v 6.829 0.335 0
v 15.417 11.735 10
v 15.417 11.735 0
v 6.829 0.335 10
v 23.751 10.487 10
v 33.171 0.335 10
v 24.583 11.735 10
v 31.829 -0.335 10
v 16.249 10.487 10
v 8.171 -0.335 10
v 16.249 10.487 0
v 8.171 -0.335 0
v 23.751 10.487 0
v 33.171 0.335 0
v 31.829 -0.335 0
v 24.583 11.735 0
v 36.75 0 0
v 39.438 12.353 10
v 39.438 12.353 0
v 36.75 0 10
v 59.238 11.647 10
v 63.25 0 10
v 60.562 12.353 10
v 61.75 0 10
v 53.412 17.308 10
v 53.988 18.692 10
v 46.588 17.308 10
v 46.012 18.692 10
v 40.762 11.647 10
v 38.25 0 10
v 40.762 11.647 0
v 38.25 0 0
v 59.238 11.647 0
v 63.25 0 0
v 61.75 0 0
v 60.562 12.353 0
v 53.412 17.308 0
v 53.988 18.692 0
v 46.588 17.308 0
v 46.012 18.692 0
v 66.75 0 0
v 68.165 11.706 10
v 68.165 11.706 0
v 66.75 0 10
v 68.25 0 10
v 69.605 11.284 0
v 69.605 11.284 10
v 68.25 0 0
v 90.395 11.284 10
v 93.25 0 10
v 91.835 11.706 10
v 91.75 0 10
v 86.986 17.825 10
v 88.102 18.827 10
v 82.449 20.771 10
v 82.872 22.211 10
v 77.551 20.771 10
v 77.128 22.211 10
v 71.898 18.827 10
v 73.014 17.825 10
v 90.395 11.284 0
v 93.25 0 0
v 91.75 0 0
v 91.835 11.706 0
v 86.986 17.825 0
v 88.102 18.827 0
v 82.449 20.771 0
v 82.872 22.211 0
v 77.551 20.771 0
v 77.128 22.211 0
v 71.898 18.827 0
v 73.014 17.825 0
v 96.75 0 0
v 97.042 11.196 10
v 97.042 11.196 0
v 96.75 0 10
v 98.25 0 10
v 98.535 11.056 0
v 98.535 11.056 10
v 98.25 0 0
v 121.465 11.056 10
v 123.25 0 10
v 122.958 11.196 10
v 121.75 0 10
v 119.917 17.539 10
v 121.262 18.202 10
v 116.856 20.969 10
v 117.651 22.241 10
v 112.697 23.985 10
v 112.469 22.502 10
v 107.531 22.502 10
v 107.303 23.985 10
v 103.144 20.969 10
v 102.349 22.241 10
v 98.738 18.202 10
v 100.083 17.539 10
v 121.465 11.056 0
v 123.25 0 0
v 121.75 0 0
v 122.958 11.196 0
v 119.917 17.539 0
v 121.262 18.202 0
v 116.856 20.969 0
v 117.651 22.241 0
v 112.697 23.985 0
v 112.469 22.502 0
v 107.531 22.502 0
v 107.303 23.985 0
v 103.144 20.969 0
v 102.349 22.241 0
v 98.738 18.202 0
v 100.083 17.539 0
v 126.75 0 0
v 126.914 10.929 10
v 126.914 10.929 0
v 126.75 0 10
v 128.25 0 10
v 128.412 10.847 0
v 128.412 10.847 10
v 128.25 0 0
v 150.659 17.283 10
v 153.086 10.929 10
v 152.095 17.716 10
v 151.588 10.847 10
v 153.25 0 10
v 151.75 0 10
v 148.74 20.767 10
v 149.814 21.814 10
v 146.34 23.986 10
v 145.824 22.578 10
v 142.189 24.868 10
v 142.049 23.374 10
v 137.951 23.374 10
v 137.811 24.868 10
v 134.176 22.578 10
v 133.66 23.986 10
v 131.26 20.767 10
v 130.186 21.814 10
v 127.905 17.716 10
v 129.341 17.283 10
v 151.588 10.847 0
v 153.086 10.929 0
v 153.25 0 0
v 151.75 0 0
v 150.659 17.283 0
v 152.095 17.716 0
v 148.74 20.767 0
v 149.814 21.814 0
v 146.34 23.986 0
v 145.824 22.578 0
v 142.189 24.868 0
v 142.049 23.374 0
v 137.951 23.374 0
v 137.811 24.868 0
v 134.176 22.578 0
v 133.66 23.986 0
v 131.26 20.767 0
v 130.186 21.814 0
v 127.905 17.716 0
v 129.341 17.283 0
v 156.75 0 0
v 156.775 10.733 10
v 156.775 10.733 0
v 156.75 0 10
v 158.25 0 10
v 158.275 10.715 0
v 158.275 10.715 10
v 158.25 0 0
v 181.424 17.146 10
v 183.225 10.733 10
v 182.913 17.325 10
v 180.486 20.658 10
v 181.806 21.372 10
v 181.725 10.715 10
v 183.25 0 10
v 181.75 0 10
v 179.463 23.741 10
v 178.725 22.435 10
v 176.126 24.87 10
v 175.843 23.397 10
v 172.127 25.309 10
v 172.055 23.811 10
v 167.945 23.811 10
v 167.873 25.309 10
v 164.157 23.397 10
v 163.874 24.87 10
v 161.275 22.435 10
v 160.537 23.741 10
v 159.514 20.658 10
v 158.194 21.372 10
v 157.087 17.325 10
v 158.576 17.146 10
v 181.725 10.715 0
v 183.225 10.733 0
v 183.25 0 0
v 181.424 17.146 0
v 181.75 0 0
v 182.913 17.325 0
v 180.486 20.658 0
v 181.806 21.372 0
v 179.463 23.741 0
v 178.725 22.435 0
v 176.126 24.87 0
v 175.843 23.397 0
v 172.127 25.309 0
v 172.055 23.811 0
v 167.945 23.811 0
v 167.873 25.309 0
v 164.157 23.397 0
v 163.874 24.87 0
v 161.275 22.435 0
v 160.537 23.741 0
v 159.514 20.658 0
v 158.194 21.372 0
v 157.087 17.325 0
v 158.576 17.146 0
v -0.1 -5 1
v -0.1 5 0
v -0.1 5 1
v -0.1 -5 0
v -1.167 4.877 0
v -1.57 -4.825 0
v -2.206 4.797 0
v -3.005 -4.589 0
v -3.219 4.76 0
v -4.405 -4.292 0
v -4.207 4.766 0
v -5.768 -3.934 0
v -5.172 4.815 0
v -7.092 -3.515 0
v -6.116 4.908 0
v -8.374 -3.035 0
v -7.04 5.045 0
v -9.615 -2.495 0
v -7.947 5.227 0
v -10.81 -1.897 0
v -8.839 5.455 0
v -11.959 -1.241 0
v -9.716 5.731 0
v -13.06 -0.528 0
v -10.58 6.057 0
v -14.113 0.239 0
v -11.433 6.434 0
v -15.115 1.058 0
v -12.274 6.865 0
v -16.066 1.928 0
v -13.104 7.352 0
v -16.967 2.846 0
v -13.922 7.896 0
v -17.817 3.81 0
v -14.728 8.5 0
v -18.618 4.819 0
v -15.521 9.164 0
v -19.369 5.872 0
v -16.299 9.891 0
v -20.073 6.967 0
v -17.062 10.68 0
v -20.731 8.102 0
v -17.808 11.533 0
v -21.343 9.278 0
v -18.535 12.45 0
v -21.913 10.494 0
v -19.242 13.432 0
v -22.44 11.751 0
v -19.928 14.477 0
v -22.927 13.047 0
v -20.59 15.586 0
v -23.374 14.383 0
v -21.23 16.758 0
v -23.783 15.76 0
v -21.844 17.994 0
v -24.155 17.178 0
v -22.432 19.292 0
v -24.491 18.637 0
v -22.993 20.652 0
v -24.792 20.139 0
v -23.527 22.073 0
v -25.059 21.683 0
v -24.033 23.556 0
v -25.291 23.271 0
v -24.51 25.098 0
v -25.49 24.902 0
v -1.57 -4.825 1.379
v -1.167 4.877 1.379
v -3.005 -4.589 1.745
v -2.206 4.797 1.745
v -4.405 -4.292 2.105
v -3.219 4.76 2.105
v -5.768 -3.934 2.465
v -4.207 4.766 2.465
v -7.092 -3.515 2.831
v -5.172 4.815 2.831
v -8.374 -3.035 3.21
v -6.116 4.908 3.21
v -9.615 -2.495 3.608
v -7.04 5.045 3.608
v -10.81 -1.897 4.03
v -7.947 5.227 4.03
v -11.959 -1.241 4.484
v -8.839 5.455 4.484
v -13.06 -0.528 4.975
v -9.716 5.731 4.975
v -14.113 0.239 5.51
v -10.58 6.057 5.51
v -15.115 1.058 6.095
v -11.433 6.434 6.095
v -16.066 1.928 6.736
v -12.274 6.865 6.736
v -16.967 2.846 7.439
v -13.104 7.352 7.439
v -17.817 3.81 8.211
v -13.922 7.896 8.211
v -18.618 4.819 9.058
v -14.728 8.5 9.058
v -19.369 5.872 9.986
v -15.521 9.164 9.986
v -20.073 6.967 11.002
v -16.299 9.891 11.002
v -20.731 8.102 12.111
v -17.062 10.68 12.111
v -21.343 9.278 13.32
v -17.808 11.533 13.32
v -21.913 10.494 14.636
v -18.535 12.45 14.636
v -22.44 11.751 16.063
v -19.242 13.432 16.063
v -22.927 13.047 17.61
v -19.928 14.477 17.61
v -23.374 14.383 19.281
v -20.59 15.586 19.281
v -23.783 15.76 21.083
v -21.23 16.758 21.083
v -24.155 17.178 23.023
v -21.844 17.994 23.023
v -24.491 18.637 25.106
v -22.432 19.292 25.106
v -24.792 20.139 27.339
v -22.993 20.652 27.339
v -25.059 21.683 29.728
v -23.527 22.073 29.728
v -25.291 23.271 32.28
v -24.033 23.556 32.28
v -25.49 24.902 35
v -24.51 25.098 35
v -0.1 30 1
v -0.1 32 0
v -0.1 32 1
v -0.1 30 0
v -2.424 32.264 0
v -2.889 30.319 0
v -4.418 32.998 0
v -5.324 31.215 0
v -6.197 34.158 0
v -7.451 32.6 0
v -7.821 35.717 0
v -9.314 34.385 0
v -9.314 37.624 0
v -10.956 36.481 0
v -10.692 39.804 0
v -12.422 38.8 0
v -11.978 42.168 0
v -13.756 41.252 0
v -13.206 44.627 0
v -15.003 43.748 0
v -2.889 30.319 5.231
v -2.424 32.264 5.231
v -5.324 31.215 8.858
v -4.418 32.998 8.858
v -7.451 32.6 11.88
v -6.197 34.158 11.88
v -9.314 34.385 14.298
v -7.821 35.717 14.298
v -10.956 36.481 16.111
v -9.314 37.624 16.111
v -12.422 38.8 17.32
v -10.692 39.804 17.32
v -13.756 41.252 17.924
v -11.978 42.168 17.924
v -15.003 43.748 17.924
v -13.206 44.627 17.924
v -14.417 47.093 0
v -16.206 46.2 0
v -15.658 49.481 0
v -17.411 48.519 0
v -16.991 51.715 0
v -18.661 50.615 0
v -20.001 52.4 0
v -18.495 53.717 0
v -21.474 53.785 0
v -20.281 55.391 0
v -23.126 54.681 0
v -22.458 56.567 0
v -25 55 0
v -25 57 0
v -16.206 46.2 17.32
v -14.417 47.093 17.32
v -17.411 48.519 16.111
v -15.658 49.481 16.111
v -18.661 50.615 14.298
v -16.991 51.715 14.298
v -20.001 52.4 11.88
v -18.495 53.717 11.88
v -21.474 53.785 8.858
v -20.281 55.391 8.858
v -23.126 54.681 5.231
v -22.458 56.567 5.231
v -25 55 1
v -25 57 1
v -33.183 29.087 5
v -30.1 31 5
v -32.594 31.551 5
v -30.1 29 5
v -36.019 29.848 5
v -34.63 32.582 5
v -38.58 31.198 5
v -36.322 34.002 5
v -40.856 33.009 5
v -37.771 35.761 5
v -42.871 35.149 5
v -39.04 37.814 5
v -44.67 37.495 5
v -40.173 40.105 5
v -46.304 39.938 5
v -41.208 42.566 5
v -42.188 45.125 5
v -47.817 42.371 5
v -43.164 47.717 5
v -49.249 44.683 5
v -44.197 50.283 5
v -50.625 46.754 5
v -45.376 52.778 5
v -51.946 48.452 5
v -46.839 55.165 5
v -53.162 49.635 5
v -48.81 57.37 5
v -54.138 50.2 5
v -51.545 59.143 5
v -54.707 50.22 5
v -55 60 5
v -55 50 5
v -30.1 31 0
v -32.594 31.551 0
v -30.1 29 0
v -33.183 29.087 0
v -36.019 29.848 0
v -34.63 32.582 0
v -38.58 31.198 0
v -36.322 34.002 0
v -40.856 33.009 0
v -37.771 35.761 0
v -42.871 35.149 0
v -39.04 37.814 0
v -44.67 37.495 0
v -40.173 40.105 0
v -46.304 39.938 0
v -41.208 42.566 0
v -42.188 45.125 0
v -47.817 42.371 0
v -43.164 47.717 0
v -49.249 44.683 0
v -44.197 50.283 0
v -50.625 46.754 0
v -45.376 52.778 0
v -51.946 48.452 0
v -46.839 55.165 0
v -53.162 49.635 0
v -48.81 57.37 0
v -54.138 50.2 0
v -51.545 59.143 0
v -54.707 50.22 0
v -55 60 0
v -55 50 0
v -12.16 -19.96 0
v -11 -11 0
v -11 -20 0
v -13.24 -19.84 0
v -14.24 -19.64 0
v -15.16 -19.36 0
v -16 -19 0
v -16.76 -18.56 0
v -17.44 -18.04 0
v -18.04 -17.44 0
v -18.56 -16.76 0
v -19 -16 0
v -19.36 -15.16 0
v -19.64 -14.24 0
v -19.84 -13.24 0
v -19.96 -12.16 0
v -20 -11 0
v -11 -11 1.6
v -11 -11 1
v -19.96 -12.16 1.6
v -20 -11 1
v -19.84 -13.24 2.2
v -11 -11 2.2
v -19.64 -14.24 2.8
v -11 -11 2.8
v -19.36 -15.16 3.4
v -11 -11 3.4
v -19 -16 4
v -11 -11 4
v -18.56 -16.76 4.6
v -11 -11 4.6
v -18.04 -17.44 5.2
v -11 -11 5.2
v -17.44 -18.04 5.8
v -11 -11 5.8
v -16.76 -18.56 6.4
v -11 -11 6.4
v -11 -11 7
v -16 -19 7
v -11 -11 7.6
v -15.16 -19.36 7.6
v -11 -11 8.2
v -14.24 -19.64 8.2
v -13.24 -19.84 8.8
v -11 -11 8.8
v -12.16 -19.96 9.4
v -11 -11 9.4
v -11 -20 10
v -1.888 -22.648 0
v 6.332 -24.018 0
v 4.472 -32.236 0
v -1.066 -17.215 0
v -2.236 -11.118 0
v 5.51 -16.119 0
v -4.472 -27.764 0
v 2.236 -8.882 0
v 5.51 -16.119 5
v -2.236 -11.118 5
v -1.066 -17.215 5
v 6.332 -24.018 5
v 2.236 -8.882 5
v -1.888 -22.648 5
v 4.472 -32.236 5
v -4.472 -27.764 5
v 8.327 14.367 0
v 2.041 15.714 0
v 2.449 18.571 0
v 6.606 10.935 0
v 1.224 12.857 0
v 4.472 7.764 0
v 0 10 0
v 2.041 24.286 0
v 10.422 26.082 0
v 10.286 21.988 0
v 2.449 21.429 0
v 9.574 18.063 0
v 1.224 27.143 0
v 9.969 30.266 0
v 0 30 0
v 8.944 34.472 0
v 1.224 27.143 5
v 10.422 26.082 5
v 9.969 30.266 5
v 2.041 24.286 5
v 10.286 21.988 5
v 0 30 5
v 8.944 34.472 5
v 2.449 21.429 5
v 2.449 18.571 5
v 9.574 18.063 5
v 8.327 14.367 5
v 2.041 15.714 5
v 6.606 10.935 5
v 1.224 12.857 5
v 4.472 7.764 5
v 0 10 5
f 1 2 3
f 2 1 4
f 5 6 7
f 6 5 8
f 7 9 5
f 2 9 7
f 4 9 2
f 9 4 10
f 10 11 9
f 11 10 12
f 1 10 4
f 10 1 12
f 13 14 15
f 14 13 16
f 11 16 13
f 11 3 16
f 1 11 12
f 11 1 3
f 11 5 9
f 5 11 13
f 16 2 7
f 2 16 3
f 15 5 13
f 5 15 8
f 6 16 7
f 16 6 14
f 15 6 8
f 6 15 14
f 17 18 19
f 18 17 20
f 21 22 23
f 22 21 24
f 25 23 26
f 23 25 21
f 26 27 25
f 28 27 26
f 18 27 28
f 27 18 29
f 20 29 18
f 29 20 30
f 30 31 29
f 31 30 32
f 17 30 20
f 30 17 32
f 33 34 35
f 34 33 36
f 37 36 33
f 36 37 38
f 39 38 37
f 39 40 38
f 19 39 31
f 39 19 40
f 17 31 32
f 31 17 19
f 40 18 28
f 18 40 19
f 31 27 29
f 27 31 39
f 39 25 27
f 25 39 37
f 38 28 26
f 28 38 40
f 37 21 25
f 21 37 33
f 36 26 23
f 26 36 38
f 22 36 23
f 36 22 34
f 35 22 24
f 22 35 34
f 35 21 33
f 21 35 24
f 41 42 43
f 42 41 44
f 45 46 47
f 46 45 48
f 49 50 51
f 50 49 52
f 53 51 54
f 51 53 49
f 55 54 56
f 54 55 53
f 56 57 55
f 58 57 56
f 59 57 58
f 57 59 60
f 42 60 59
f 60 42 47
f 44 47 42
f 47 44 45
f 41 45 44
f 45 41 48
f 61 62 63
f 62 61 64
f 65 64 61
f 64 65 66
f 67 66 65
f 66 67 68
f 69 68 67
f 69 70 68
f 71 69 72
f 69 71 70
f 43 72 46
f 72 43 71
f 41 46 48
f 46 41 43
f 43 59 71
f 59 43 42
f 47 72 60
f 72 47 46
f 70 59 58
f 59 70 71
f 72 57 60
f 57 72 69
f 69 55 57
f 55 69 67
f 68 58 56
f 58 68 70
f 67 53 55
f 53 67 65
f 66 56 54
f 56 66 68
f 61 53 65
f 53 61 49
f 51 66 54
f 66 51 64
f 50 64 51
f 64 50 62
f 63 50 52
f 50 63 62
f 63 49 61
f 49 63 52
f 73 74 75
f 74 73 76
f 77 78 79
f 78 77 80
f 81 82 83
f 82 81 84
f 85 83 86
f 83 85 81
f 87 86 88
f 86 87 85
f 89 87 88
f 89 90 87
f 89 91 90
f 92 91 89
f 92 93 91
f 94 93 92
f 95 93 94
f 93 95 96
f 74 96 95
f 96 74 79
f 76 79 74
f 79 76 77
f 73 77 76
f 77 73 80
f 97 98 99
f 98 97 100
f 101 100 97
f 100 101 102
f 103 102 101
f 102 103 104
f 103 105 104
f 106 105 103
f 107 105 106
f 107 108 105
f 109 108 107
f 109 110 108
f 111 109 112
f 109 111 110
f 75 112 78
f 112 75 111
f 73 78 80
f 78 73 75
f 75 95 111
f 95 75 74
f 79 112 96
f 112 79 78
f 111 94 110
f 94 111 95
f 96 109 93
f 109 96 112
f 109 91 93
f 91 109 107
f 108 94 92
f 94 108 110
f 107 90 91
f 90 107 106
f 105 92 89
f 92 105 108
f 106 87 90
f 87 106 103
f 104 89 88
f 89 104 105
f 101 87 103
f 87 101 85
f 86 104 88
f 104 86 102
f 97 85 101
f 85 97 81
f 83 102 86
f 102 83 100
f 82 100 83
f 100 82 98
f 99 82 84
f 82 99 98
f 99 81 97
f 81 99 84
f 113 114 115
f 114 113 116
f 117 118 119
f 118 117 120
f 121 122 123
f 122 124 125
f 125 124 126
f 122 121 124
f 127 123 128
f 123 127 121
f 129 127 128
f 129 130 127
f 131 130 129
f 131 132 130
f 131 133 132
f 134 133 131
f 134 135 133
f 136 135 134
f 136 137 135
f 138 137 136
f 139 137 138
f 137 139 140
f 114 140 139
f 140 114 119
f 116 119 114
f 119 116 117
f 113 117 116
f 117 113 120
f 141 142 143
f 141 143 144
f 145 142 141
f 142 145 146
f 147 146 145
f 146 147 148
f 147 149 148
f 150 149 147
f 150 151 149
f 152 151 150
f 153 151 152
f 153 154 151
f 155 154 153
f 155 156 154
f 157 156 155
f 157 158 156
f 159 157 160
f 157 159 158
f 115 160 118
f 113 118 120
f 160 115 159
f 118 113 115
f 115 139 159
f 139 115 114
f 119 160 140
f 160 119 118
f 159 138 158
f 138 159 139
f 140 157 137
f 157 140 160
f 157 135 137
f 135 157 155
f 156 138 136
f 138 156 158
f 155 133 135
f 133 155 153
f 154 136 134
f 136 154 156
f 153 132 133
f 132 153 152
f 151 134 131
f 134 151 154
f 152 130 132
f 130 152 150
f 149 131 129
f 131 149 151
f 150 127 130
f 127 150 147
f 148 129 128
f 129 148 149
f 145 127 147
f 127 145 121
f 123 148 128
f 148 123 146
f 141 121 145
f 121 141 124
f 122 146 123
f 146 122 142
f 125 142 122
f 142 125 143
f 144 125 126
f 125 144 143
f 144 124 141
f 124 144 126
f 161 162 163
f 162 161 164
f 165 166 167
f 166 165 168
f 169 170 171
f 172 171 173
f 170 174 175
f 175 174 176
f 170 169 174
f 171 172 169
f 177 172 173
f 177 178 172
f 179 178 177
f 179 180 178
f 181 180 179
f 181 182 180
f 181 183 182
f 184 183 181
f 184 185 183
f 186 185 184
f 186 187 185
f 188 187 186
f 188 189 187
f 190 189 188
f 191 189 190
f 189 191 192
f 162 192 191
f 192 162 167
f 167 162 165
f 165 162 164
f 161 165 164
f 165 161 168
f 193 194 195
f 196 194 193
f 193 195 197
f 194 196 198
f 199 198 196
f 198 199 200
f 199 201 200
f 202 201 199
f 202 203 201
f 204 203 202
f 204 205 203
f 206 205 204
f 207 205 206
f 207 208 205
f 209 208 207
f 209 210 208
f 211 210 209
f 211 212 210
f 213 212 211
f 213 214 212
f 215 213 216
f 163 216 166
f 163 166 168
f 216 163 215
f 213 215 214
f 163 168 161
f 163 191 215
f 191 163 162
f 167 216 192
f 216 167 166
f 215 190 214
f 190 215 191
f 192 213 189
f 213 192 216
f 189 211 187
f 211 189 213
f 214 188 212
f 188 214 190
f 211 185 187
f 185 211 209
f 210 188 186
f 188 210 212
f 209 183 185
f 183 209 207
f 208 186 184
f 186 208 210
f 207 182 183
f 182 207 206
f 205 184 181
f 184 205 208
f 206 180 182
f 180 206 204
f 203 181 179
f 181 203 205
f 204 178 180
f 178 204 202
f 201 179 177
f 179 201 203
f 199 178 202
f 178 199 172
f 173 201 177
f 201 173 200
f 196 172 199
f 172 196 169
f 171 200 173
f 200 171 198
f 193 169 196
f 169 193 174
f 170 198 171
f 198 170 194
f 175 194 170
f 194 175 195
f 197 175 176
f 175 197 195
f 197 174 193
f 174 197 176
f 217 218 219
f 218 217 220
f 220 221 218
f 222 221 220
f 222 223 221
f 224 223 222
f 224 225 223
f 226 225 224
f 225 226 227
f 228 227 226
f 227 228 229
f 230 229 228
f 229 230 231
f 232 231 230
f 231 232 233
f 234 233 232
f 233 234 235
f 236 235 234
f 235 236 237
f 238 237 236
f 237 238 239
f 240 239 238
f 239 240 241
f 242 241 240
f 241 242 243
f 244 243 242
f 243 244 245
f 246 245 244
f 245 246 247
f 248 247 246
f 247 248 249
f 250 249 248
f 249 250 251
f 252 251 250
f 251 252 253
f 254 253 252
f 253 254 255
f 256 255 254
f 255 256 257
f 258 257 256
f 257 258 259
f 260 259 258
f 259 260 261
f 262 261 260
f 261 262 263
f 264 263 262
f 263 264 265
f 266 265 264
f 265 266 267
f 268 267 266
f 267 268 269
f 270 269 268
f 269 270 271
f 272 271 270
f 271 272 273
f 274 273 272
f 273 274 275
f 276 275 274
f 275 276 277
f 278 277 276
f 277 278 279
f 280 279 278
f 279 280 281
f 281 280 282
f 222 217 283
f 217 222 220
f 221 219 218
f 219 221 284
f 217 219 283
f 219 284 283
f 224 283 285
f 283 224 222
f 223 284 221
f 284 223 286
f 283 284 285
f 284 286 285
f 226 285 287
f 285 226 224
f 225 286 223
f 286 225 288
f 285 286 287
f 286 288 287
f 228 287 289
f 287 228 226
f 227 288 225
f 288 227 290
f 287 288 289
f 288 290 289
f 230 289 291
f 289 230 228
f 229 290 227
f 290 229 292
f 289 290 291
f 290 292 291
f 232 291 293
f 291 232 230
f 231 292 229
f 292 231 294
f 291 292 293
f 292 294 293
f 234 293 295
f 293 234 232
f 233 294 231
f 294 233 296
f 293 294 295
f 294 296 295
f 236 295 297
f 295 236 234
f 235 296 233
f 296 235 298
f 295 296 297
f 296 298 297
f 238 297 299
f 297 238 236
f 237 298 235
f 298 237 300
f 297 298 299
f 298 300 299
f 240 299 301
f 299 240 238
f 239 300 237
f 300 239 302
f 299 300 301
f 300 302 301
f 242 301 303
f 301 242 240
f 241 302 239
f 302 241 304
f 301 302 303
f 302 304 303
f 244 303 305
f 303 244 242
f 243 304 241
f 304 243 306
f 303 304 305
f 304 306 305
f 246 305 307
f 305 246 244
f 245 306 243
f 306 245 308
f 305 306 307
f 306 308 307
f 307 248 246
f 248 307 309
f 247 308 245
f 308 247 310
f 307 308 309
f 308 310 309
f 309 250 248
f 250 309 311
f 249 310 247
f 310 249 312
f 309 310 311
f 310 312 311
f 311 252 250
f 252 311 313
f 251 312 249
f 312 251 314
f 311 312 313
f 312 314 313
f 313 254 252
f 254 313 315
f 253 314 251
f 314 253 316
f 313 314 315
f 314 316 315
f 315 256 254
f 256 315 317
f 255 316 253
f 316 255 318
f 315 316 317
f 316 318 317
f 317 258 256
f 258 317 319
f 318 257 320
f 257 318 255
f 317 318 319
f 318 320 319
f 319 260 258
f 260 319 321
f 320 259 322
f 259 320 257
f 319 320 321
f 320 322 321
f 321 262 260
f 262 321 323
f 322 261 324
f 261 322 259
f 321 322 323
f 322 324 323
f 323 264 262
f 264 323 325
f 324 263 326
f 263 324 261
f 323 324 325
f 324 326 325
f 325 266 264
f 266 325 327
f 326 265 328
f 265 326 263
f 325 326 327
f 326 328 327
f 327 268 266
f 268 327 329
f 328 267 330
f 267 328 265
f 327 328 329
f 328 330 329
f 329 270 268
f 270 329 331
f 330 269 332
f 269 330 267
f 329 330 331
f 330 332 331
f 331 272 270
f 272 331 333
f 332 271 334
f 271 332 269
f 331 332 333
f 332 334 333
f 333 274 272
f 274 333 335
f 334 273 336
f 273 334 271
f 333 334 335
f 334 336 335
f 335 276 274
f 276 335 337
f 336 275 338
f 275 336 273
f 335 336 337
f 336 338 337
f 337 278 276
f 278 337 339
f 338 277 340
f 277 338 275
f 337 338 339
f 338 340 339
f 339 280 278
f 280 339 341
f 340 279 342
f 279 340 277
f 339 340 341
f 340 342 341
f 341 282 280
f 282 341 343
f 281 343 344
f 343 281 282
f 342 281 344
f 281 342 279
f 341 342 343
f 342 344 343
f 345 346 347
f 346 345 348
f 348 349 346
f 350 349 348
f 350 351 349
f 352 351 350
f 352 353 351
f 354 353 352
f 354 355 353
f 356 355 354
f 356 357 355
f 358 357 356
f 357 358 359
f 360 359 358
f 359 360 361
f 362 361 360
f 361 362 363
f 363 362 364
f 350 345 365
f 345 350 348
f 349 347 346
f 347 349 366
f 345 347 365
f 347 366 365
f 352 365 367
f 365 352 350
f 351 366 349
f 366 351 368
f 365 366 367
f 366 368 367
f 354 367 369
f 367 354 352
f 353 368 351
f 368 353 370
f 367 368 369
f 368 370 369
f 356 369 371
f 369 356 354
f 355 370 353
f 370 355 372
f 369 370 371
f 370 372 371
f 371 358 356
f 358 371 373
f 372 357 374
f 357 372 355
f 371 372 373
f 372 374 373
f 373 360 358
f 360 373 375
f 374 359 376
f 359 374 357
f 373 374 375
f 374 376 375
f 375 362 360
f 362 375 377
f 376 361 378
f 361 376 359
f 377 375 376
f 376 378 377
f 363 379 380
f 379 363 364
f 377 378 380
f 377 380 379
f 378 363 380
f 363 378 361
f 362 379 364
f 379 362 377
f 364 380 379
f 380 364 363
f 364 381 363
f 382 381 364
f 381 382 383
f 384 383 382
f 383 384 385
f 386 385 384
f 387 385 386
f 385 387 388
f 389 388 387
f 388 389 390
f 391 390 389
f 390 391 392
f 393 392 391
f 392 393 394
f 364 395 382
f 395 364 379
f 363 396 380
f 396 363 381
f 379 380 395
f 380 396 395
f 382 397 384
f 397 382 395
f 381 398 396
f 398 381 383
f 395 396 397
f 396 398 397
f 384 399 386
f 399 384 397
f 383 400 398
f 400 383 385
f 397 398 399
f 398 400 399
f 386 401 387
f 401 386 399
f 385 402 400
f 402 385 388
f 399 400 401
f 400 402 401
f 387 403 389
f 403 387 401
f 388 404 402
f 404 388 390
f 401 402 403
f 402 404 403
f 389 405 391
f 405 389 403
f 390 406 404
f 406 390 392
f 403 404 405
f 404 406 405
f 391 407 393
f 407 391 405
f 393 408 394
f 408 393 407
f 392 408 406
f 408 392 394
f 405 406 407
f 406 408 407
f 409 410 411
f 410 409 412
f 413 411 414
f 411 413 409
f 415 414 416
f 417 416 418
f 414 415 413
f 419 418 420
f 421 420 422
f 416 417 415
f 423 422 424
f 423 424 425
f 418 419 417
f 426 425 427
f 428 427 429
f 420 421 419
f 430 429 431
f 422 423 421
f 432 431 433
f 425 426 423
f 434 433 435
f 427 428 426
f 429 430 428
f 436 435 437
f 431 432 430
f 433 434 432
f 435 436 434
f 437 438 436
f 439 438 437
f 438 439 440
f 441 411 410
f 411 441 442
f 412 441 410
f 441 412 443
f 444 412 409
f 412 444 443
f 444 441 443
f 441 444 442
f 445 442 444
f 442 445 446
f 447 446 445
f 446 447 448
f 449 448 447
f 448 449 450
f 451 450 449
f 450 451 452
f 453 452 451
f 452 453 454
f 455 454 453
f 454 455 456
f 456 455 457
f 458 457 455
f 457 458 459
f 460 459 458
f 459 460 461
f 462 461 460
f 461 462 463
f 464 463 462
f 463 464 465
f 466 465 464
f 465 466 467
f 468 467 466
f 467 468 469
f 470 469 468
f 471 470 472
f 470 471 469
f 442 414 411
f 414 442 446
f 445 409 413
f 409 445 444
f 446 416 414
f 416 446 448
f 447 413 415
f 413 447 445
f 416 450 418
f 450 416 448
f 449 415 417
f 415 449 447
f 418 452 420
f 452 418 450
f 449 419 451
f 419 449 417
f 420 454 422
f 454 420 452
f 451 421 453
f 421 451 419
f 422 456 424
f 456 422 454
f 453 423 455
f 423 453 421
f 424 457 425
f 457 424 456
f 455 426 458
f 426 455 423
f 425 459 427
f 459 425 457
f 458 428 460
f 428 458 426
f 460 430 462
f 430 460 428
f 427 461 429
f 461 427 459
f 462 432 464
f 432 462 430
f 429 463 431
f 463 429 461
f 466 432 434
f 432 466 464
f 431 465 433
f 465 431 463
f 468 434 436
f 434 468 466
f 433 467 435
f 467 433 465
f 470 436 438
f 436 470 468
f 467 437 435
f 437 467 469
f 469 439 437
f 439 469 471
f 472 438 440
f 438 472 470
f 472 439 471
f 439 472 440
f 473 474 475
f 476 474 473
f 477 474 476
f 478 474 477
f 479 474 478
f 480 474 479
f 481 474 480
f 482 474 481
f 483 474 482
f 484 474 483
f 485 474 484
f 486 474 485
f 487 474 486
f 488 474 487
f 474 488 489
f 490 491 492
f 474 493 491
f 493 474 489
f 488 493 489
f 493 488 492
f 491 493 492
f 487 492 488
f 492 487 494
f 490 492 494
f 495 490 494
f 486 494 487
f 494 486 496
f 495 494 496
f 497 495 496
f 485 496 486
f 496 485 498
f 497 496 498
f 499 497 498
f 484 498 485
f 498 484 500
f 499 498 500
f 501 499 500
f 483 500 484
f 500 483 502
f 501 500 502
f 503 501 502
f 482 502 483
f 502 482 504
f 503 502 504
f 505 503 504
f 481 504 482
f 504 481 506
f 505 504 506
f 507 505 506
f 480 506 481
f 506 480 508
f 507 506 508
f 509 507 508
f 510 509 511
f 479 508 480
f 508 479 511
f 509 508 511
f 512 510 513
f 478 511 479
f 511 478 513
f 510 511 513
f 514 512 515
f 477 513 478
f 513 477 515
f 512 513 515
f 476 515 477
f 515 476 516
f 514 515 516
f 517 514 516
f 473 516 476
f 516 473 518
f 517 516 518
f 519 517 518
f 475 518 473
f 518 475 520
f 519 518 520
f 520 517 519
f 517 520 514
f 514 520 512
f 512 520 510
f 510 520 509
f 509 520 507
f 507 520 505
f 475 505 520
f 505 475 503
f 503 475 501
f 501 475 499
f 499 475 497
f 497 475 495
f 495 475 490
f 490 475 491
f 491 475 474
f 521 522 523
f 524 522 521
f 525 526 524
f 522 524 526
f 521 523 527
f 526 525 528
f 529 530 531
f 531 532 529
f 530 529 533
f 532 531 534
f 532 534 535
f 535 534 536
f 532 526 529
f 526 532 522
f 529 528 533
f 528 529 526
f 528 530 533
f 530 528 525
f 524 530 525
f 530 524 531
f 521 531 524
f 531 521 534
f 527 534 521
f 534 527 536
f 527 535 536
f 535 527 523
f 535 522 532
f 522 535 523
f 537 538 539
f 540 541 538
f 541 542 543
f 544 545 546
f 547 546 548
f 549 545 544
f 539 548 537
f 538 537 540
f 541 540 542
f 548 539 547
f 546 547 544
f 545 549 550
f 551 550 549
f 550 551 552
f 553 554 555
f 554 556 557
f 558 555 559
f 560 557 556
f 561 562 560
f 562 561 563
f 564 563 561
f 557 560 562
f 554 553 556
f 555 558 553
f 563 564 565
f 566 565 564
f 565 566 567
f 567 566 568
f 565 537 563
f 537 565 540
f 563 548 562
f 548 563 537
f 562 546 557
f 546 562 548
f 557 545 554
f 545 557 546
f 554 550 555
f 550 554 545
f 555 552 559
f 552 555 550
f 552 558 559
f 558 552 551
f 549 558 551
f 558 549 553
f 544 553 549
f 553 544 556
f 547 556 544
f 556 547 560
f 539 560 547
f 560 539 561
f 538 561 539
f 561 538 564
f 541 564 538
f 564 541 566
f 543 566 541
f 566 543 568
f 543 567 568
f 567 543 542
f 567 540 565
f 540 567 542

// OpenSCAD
use <BezierScad.scad>;
x = 25;

translate([7.5,0,0]) 
BezWall( [
  [0,0],
  [x/2, x],
  [x,0],
] , width = 1.5, height = 10, steps = 4, centered = true, showCtlR = 1);

translate([37.5,0,0]) 
BezWall( [
  [0,0],
  [0, x], [x, x],
  [x,0],
] , width = 1.5, height = 10, steps = 6, centered = true, showCtlR = 1 );

translate([67.5,0,0]) 
BezWall( [
  [0,0],
  [0, x], [x/2, x], [x, x],
  [x,0],
] , width = 1.5, height = 10, steps = 8, centered = true, showCtlR = 1 );

translate([97.5,0,0]) 
BezWall( [
  [0,0],
  [0, x], [0, x], [x, x], [x, x],
  [x,0],
] , width = 1.5, height = 10, steps = 10, centered = true, showCtlR = 1 );

translate([127.5,0,0]) 
BezWall( [
  [0,0],
  [0, x], [0, x], [x/2, x], [x, x], [x, x],
  [x,0],
] , width = 1.5, height = 10, steps = 12, centered = true, showCtlR = 1 );

color("red")
translate([157.5,0,0]) 
BezWall( [
  [0,0],
  [0, x], [0, x], [0, x], [x, x], [x, x], [x, x],
  [x,0],
] , width = 1.5, height = 10, steps = 14, centered = true, showCtlR = 1 );

BezWall([
  [-0.1,0],
  [-20, 0],
  [-25,25]
  ],  widthCtls = [10, 1], 
      heightCtls = [1, 5, 6, 35], 
      steps = 32,
      centered = true, showCtlR = 1
);
translate([0,30,0])
BezWall([
  [-0.1,0],
  [-15, 0],
  [-15, 25],
  [-25,25]
  ],  
    width = 2, 
    heightCtls = [1, 35, 1], 
    steps = 16,
    centered = false, showCtlR = 1
);

translate([-30,30,0])
BezWall([
  [-0.1,0],
  [-15, 0],
  [-15, 25],
  [-25,25]
  ],  
    widthCtls = [2, 10], 
    height = 5, 
    steps = 16,
    centered = true, showCtlR = 1
);

linear_extrude(height = 5) 
BezLine([
  [0,-10], [5, -20], [0,-30]
  ], width = [5, 10], resolution = 2, centered = true);

linear_extrude(height = 5) 
BezLine([
  [0,10], [5, 20], [0,30]
  ], width = [5, 10], resolution = 3, centered = false);

translate([-10, -10,0])
BezArc([
  [-10,-1],
  [-10, -10],
  [-1,-10]
  ], [-1,-1], steps = 16, heightCtls = [1,10]);
